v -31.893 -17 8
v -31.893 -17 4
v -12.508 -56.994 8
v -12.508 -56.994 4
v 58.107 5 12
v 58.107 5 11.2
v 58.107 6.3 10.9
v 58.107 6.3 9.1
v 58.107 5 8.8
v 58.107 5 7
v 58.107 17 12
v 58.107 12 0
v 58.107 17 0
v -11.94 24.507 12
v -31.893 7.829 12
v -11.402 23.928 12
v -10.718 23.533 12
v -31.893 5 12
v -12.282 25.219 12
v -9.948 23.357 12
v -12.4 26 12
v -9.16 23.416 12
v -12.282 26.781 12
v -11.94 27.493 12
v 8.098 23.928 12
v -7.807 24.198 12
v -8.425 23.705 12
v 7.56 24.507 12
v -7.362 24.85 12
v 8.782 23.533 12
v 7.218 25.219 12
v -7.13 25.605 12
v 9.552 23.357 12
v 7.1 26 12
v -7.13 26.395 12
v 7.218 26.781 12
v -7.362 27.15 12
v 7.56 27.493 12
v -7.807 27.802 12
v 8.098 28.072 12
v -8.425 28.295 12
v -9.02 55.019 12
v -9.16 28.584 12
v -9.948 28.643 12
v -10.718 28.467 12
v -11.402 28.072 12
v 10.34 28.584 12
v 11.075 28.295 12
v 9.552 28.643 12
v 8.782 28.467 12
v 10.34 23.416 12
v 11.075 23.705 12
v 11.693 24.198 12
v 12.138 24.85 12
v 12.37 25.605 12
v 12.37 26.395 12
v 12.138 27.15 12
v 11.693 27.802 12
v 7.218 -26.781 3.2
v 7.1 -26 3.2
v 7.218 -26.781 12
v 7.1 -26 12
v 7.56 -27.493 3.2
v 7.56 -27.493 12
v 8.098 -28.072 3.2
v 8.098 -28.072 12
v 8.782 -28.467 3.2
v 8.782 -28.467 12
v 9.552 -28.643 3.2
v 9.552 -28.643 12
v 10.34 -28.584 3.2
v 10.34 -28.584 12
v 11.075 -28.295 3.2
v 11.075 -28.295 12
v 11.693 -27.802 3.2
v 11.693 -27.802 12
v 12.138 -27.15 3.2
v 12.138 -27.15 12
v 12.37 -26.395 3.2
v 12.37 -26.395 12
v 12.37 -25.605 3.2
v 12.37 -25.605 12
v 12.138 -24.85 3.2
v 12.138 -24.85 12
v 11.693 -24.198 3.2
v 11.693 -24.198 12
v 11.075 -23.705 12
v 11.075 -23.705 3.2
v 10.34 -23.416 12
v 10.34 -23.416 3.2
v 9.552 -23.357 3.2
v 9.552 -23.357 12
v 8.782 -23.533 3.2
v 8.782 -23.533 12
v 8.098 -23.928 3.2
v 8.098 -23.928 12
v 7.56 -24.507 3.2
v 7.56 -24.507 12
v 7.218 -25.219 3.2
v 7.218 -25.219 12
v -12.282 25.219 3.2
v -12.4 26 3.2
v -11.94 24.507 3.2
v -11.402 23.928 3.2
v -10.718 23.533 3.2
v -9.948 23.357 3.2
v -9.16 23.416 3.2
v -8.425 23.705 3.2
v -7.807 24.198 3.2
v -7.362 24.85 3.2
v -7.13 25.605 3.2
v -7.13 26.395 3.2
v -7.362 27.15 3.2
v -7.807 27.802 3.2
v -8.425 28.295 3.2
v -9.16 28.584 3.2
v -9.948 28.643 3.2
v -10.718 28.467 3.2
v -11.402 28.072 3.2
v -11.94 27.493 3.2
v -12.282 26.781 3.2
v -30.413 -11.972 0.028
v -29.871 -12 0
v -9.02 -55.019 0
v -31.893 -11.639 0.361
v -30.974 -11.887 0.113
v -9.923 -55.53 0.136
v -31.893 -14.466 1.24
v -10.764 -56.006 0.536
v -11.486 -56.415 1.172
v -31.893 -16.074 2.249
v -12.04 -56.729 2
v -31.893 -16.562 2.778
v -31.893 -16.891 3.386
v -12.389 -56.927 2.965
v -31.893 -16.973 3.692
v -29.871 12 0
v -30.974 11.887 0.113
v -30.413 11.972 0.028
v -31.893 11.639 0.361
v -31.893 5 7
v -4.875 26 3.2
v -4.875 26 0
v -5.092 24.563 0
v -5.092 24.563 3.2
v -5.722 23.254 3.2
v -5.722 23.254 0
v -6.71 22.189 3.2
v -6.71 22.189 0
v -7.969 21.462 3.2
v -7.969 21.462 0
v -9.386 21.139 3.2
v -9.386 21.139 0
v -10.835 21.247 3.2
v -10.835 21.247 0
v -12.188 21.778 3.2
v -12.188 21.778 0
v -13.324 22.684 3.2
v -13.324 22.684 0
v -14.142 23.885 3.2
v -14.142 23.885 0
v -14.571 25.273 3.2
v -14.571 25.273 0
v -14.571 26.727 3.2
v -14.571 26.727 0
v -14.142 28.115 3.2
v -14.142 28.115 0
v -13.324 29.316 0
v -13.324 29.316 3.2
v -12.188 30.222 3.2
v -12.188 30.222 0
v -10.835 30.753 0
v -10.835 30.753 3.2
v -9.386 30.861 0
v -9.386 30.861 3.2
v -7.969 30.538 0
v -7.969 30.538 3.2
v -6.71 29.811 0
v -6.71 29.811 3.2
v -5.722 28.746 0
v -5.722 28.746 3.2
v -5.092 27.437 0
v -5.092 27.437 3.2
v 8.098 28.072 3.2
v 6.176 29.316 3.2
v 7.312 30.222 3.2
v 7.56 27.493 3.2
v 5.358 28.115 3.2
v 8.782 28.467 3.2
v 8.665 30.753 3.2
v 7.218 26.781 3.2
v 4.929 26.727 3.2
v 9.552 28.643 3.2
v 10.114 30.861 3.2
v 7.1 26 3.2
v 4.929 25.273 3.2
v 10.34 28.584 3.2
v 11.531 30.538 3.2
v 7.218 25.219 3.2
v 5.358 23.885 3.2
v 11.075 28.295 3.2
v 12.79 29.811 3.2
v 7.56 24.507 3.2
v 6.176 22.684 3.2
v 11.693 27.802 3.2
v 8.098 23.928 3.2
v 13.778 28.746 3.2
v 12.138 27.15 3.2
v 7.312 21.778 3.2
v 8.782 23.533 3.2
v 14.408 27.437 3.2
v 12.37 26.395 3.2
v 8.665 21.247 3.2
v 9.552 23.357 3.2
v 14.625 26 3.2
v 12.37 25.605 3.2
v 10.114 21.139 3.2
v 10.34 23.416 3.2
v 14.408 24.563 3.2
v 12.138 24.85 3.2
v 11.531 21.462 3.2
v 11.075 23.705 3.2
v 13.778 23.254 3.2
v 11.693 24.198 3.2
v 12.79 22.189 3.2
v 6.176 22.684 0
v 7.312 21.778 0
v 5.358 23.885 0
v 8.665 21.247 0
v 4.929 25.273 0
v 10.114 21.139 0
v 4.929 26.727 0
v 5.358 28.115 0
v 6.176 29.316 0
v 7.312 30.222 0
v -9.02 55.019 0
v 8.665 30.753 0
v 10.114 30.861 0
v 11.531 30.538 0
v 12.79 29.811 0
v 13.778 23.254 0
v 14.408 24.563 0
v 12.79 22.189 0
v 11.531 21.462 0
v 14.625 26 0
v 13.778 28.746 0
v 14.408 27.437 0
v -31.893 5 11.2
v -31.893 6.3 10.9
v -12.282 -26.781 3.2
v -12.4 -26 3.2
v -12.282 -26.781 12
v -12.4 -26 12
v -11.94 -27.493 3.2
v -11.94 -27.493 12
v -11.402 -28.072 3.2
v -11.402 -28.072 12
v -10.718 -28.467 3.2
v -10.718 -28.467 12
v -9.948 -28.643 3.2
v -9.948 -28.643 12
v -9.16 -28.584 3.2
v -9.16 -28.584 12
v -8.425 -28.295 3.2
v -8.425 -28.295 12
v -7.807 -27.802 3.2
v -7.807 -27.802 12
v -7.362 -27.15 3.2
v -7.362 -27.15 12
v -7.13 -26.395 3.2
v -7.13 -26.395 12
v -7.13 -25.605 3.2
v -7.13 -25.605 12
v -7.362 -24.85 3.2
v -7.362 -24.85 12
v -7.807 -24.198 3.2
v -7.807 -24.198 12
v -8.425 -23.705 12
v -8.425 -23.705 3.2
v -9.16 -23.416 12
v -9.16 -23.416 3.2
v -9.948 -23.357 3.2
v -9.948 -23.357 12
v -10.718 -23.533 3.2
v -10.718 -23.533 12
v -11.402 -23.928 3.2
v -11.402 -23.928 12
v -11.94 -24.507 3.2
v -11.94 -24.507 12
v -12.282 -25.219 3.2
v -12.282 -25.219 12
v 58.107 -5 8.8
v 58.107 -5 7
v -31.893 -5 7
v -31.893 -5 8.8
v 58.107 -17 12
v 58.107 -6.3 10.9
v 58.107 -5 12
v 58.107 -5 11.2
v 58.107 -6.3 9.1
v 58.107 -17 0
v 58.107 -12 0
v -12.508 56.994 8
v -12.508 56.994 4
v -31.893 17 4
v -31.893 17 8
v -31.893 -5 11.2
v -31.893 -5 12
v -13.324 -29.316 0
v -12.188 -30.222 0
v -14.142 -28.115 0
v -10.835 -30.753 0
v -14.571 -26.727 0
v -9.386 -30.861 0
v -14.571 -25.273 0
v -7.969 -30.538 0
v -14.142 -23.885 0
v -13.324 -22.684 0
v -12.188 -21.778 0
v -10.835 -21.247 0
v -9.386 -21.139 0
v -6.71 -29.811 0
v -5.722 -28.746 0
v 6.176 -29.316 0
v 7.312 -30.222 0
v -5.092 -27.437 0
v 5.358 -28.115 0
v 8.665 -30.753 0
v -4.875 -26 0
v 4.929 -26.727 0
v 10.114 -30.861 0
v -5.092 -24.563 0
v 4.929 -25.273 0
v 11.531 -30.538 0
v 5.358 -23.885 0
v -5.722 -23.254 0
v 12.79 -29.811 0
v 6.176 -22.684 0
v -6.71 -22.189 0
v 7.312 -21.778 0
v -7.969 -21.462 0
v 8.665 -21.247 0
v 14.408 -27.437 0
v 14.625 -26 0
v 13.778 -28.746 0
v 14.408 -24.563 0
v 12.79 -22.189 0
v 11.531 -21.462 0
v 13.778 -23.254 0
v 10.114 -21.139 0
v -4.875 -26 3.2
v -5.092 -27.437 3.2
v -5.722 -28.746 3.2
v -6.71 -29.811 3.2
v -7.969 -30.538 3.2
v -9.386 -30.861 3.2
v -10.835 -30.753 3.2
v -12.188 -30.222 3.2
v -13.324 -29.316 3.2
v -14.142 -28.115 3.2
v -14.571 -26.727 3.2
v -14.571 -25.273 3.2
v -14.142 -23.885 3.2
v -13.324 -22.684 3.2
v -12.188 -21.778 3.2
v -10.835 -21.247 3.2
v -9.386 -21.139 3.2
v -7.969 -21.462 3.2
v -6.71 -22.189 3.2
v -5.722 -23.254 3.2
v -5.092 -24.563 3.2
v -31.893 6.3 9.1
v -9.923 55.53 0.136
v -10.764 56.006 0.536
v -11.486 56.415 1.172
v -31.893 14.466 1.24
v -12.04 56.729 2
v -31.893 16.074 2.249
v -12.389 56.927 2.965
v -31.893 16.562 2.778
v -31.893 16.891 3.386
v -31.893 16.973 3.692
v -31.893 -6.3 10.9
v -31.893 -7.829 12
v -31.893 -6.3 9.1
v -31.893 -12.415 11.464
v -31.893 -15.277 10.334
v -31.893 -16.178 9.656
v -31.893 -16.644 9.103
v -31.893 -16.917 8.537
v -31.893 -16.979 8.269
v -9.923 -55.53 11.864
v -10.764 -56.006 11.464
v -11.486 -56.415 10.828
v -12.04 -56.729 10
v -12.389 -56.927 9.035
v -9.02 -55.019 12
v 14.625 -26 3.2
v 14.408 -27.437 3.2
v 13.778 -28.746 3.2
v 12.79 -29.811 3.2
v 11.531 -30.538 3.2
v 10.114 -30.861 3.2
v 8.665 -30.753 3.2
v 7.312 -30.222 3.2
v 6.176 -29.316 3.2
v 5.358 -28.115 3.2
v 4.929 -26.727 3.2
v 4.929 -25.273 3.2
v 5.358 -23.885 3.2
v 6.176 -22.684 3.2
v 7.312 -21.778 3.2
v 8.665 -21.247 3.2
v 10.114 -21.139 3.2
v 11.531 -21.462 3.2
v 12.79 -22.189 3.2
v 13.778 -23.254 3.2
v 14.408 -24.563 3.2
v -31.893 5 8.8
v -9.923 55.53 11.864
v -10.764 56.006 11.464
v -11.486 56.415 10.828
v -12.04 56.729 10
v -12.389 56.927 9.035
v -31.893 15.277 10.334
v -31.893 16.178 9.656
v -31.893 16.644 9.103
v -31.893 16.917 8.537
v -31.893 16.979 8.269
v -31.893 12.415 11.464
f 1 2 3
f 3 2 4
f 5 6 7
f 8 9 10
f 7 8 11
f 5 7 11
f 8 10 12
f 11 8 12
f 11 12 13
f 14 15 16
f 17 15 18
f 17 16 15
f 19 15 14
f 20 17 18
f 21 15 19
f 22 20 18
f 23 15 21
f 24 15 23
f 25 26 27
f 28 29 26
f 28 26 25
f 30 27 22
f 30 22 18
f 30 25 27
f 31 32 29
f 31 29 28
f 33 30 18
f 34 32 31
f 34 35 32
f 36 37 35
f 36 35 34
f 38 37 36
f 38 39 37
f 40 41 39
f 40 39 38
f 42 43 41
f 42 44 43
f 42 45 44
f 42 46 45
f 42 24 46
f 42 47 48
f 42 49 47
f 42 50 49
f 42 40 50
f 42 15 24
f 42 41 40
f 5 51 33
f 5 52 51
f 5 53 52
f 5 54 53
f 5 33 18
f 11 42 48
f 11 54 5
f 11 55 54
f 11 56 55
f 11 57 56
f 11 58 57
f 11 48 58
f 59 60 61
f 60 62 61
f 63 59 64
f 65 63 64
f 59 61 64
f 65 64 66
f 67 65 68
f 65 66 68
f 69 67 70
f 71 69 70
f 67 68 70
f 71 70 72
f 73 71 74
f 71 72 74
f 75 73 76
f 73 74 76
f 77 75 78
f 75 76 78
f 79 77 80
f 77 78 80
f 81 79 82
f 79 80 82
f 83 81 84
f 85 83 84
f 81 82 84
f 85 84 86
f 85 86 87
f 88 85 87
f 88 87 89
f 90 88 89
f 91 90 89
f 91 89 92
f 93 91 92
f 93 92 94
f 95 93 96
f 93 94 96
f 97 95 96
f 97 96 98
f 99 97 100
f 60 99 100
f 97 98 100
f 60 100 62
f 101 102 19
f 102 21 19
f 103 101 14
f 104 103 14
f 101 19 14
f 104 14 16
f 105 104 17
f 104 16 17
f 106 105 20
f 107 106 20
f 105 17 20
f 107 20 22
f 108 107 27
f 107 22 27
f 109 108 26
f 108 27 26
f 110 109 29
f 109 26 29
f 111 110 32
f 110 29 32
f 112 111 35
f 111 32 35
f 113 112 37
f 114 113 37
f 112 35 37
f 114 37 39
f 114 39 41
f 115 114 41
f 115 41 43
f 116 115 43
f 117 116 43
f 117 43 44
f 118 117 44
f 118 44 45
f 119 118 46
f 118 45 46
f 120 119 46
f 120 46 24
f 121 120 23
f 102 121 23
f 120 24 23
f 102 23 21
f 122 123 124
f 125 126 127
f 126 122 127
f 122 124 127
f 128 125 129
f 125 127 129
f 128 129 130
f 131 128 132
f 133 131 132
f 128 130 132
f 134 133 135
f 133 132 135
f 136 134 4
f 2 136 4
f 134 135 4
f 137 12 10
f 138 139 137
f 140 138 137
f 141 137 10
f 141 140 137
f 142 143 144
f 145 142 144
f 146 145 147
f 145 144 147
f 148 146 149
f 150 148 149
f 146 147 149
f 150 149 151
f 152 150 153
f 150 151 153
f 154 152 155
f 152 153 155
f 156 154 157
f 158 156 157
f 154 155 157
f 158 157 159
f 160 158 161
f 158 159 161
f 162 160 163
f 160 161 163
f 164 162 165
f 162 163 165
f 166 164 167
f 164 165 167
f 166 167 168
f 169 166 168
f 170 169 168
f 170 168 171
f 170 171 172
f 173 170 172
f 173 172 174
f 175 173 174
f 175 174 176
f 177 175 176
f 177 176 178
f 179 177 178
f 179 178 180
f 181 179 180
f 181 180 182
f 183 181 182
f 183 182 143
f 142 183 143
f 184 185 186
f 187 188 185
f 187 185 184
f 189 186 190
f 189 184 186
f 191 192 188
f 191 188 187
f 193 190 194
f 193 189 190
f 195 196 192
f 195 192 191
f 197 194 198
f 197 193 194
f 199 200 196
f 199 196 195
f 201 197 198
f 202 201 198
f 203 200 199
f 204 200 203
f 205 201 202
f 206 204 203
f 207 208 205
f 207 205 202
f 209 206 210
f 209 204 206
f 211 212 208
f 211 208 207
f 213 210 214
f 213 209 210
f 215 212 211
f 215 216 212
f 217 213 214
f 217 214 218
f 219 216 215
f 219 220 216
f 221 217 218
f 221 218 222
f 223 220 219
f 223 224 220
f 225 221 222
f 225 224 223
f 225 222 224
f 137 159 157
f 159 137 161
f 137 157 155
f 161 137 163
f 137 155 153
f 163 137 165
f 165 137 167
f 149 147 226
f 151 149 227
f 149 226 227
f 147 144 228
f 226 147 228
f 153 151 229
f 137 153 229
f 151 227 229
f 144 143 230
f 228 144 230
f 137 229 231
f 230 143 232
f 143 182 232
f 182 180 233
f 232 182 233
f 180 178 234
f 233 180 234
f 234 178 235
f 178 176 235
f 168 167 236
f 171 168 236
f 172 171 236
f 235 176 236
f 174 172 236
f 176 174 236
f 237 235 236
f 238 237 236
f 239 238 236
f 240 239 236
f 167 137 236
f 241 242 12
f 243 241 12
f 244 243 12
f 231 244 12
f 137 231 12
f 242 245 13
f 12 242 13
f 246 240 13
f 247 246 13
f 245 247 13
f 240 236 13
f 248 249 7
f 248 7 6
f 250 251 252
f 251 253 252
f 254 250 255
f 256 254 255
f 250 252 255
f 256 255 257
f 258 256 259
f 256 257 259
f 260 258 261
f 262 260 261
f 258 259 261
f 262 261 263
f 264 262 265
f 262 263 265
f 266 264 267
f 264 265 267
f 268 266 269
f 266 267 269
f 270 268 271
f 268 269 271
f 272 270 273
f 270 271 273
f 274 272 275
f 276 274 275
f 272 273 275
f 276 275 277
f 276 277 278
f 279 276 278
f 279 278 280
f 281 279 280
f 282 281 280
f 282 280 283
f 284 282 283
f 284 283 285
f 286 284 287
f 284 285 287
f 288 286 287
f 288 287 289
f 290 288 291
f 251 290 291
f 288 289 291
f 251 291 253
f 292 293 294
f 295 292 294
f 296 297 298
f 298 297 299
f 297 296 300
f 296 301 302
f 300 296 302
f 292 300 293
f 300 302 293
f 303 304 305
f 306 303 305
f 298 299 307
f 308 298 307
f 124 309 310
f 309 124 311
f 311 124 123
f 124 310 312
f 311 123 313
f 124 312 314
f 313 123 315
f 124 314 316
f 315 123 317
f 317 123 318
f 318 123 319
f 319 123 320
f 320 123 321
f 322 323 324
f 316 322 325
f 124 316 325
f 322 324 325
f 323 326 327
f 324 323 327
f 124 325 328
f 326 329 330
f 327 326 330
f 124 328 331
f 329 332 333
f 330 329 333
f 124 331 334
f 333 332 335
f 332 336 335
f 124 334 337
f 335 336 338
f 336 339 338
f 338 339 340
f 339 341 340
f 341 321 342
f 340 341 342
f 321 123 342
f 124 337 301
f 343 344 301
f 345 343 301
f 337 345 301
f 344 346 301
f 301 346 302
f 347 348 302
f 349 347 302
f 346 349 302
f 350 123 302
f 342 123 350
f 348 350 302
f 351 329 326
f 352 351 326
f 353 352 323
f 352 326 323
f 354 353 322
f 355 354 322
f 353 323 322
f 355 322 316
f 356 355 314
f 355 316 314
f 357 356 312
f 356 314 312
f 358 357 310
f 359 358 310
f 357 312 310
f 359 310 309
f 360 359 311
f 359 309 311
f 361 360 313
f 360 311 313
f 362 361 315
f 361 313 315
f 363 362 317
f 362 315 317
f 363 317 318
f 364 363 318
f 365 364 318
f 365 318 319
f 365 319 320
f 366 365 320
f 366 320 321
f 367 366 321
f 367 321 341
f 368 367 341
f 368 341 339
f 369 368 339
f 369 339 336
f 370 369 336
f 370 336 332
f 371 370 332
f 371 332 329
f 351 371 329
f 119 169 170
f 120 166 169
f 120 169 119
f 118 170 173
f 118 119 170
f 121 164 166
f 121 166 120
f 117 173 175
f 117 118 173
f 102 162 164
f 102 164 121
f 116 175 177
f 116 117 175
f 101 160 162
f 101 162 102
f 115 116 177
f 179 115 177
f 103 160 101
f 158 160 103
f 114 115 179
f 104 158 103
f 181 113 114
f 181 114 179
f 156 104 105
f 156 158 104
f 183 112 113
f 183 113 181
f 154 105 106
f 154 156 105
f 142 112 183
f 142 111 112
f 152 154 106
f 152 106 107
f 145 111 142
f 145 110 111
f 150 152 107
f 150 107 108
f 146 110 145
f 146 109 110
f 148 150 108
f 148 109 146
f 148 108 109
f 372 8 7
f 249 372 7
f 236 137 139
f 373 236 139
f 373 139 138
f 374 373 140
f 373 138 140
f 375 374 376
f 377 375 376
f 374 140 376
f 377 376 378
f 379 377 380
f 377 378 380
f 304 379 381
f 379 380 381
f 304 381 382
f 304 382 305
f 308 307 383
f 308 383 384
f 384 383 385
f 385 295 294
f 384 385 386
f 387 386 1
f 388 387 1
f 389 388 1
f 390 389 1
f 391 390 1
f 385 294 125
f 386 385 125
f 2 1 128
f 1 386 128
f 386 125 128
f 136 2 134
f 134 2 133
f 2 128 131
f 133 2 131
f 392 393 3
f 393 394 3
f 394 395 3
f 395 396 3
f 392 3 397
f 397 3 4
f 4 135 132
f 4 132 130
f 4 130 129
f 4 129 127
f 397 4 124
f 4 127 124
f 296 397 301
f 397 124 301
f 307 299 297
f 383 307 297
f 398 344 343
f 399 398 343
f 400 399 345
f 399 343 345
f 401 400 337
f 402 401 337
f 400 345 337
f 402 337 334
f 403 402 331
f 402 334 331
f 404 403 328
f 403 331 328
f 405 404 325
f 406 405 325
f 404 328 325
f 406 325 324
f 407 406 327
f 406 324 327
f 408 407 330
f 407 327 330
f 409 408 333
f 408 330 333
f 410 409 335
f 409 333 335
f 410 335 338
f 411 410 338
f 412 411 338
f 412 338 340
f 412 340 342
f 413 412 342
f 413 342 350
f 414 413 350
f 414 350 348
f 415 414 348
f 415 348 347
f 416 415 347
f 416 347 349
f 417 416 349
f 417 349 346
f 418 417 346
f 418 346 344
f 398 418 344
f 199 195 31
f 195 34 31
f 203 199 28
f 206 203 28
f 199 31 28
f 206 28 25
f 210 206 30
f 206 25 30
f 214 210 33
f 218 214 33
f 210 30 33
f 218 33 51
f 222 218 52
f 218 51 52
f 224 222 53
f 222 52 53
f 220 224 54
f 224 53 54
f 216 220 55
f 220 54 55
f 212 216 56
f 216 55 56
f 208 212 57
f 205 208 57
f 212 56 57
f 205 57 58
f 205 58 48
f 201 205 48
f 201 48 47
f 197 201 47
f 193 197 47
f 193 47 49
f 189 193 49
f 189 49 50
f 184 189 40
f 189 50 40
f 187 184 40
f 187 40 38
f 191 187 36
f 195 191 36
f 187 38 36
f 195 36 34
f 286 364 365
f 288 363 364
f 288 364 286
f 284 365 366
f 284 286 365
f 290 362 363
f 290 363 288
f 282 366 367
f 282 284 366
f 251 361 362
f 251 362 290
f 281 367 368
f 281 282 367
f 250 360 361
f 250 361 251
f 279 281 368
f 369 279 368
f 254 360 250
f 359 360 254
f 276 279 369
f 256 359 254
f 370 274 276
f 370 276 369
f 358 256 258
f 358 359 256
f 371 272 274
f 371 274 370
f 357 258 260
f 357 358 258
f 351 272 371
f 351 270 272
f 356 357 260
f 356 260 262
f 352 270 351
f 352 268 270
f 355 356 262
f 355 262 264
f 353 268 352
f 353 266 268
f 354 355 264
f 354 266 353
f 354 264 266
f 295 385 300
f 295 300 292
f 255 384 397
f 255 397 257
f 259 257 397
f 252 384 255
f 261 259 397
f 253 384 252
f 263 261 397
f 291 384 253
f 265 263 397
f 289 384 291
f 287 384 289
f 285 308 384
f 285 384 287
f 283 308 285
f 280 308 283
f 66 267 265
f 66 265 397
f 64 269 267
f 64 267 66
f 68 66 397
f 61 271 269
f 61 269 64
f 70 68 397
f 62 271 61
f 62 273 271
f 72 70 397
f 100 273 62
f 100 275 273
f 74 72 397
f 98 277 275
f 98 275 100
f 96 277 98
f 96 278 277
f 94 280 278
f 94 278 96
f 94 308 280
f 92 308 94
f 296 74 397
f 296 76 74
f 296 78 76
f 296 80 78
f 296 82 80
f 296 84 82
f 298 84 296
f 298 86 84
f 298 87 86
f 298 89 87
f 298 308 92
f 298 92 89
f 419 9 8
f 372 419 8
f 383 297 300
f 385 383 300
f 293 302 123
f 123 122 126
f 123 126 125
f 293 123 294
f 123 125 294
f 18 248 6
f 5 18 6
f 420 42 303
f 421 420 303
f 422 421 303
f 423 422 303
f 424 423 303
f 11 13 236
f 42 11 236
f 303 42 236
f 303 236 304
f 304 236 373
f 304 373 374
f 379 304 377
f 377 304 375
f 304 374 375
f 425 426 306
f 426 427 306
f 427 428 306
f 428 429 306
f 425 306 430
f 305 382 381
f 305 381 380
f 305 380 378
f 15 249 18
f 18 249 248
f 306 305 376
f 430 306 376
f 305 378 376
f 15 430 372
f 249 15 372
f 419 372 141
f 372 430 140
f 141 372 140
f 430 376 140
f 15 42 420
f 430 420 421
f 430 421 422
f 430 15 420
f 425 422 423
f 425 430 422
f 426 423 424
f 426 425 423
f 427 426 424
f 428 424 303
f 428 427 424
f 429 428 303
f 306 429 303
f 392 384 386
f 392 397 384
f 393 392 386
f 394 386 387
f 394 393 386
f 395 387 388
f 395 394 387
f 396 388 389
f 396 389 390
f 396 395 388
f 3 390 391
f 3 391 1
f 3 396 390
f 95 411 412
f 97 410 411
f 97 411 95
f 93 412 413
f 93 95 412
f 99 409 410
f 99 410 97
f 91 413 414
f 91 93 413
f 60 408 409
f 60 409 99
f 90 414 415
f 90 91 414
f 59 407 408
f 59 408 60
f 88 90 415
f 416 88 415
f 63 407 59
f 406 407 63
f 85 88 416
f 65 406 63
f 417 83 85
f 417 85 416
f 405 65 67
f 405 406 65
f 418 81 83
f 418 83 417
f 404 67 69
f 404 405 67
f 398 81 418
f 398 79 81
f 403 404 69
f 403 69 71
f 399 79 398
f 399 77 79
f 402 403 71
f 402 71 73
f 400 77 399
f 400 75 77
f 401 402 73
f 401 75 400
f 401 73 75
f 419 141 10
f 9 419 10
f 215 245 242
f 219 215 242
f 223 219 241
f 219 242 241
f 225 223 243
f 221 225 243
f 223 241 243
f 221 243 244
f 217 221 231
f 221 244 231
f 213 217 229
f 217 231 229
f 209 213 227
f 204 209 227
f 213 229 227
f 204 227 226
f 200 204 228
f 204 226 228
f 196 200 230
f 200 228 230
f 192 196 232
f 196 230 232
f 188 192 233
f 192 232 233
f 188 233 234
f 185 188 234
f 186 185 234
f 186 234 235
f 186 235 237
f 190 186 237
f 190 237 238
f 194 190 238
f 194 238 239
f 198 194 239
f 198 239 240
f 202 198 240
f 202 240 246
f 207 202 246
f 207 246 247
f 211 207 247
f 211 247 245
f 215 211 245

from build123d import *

# Parameters (mm, degrees)
F2_DEPTH         = 12
F3_D             = 5.3
F3_CBORE_D       = 9.75
F3_CBORE_DEPTH   = 3.2
F3_2_D           = 5.3
F3_2_CBORE_D     = 9.75
F3_2_CBORE_DEPTH = 3.2
F5_DEPTH         = 58.1081982567
F5_DEPTH_BACK    = 31.8938017433
F6_R             = 4
F6_2_R           = 4
F7_T1_DEPTH      = 126.0035618315
F7_2_T1_DEPTH    = 126.0035618315


# Not quite as in the source:
# - a fillet or chamfer that OpenCascade refuses, or shapes differently, is made with other operations: its cross-section is extruded or revolved along the edge and cut away or added
# - a feature names something its author has since deleted; it is built from what else it names


with BuildPart() as f2:
    # F1 (on Top) → F2 (new body)
    with BuildSketch(Plane.XY):
        Polygon((-31.8928017433, 17), (-31.8928017433, 5), (58.1071982567, 5), (58.1071982567, 17), (-12.5075216938, 56.9939360137), align=None)
    extrude(amount=F2_DEPTH)

    # F3 (through all)
    with Locations(Plane(origin=(0, 0, 0), x_dir=(1, 0, 0), z_dir=(0, 0, -1))):
        with Locations((-9.75, -26), (9.75, -26), (-9.75, 26), (9.75, 26)):
            CounterBoreHole(F3_D / 2, F3_CBORE_D / 2, F3_CBORE_DEPTH)


with BuildPart() as f2b:
    # F1 (on Top) → F2, piece 2 (new body)
    with BuildSketch(Plane.XY):
        Polygon((58.1071982567, -17), (58.1071982567, -5), (-31.8928017433, -5), (-31.8928017433, -17), (-12.5075216938, -56.9939360137), align=None)
    extrude(amount=F2_DEPTH)

    # F3#2 (through all)
    with Locations(Plane(origin=(0, 0, 0), x_dir=(1, 0, 0), z_dir=(0, 0, -1))):
        with Locations((-9.75, -26), (9.75, -26), (-9.75, 26), (9.75, 26)):
            CounterBoreHole(F3_2_D / 2, F3_2_CBORE_D / 2, F3_2_CBORE_DEPTH)


with BuildPart() as f5_tool:
    # F4 (on Right) → F5 (new body, two sides)
    with BuildSketch(Plane.YZ) as f5_sk:
        Polygon((-6.3, 10.9), (-6.3, 9.1), (-5, 8.8), (-5, 11.2), align=None)
        Polygon((6.3, 9.1), (6.3, 10.9), (5, 11.2), (5, 8.8), align=None)
    extrude(amount=F5_DEPTH)
    extrude(f5_sk.sketch, amount=-F5_DEPTH_BACK)


with BuildPart() as f2_1:
    add(f2.part)

    # F5: cut by f5_tool
    add(f5_tool.part, mode=Mode.SUBTRACT)

    # F6
    f6_edges = [f2_1.edges().sort_by_distance(p)[0] for p in [
        (-22.200162, 36.996968, 12),
        (-22.200162, 36.996968, 0),
    ]]
    fillet(f6_edges, radius=F6_R)

    # F7: chamfer of 7 on 1 edges, made by hand

    # F7_s2 → F7_t1 (cut)
    with BuildSketch(Plane.YZ.offset(-49.894582659)):
        Polygon((12, 0), (5, 7), (5, 0), align=None)
    extrude(amount=F7_T1_DEPTH, mode=Mode.SUBTRACT)


with BuildPart() as f2b_1:
    add(f2b.part)

    # F5: cut by f5_tool
    add(f5_tool.part, mode=Mode.SUBTRACT)

    # F6#2
    f6_2_edges = [f2b_1.edges().sort_by_distance(p)[0] for p in [
        (-22.200162, -36.996968, 0),
        (-22.200162, -36.996968, 12),
    ]]
    fillet(f6_2_edges, radius=F6_2_R)

    # F7#2: chamfer of 7 on 1 edges, made by hand

    # F7_2_s2 → F7_2_t1 (cut)
    with BuildSketch(Plane.YZ.offset(-49.894582659)):
        Polygon((-12, 0), (-5, 7), (-5, 0), align=None)
    extrude(amount=F7_2_T1_DEPTH, mode=Mode.SUBTRACT)


solid = Compound([f2_1.part, f2b_1.part])
